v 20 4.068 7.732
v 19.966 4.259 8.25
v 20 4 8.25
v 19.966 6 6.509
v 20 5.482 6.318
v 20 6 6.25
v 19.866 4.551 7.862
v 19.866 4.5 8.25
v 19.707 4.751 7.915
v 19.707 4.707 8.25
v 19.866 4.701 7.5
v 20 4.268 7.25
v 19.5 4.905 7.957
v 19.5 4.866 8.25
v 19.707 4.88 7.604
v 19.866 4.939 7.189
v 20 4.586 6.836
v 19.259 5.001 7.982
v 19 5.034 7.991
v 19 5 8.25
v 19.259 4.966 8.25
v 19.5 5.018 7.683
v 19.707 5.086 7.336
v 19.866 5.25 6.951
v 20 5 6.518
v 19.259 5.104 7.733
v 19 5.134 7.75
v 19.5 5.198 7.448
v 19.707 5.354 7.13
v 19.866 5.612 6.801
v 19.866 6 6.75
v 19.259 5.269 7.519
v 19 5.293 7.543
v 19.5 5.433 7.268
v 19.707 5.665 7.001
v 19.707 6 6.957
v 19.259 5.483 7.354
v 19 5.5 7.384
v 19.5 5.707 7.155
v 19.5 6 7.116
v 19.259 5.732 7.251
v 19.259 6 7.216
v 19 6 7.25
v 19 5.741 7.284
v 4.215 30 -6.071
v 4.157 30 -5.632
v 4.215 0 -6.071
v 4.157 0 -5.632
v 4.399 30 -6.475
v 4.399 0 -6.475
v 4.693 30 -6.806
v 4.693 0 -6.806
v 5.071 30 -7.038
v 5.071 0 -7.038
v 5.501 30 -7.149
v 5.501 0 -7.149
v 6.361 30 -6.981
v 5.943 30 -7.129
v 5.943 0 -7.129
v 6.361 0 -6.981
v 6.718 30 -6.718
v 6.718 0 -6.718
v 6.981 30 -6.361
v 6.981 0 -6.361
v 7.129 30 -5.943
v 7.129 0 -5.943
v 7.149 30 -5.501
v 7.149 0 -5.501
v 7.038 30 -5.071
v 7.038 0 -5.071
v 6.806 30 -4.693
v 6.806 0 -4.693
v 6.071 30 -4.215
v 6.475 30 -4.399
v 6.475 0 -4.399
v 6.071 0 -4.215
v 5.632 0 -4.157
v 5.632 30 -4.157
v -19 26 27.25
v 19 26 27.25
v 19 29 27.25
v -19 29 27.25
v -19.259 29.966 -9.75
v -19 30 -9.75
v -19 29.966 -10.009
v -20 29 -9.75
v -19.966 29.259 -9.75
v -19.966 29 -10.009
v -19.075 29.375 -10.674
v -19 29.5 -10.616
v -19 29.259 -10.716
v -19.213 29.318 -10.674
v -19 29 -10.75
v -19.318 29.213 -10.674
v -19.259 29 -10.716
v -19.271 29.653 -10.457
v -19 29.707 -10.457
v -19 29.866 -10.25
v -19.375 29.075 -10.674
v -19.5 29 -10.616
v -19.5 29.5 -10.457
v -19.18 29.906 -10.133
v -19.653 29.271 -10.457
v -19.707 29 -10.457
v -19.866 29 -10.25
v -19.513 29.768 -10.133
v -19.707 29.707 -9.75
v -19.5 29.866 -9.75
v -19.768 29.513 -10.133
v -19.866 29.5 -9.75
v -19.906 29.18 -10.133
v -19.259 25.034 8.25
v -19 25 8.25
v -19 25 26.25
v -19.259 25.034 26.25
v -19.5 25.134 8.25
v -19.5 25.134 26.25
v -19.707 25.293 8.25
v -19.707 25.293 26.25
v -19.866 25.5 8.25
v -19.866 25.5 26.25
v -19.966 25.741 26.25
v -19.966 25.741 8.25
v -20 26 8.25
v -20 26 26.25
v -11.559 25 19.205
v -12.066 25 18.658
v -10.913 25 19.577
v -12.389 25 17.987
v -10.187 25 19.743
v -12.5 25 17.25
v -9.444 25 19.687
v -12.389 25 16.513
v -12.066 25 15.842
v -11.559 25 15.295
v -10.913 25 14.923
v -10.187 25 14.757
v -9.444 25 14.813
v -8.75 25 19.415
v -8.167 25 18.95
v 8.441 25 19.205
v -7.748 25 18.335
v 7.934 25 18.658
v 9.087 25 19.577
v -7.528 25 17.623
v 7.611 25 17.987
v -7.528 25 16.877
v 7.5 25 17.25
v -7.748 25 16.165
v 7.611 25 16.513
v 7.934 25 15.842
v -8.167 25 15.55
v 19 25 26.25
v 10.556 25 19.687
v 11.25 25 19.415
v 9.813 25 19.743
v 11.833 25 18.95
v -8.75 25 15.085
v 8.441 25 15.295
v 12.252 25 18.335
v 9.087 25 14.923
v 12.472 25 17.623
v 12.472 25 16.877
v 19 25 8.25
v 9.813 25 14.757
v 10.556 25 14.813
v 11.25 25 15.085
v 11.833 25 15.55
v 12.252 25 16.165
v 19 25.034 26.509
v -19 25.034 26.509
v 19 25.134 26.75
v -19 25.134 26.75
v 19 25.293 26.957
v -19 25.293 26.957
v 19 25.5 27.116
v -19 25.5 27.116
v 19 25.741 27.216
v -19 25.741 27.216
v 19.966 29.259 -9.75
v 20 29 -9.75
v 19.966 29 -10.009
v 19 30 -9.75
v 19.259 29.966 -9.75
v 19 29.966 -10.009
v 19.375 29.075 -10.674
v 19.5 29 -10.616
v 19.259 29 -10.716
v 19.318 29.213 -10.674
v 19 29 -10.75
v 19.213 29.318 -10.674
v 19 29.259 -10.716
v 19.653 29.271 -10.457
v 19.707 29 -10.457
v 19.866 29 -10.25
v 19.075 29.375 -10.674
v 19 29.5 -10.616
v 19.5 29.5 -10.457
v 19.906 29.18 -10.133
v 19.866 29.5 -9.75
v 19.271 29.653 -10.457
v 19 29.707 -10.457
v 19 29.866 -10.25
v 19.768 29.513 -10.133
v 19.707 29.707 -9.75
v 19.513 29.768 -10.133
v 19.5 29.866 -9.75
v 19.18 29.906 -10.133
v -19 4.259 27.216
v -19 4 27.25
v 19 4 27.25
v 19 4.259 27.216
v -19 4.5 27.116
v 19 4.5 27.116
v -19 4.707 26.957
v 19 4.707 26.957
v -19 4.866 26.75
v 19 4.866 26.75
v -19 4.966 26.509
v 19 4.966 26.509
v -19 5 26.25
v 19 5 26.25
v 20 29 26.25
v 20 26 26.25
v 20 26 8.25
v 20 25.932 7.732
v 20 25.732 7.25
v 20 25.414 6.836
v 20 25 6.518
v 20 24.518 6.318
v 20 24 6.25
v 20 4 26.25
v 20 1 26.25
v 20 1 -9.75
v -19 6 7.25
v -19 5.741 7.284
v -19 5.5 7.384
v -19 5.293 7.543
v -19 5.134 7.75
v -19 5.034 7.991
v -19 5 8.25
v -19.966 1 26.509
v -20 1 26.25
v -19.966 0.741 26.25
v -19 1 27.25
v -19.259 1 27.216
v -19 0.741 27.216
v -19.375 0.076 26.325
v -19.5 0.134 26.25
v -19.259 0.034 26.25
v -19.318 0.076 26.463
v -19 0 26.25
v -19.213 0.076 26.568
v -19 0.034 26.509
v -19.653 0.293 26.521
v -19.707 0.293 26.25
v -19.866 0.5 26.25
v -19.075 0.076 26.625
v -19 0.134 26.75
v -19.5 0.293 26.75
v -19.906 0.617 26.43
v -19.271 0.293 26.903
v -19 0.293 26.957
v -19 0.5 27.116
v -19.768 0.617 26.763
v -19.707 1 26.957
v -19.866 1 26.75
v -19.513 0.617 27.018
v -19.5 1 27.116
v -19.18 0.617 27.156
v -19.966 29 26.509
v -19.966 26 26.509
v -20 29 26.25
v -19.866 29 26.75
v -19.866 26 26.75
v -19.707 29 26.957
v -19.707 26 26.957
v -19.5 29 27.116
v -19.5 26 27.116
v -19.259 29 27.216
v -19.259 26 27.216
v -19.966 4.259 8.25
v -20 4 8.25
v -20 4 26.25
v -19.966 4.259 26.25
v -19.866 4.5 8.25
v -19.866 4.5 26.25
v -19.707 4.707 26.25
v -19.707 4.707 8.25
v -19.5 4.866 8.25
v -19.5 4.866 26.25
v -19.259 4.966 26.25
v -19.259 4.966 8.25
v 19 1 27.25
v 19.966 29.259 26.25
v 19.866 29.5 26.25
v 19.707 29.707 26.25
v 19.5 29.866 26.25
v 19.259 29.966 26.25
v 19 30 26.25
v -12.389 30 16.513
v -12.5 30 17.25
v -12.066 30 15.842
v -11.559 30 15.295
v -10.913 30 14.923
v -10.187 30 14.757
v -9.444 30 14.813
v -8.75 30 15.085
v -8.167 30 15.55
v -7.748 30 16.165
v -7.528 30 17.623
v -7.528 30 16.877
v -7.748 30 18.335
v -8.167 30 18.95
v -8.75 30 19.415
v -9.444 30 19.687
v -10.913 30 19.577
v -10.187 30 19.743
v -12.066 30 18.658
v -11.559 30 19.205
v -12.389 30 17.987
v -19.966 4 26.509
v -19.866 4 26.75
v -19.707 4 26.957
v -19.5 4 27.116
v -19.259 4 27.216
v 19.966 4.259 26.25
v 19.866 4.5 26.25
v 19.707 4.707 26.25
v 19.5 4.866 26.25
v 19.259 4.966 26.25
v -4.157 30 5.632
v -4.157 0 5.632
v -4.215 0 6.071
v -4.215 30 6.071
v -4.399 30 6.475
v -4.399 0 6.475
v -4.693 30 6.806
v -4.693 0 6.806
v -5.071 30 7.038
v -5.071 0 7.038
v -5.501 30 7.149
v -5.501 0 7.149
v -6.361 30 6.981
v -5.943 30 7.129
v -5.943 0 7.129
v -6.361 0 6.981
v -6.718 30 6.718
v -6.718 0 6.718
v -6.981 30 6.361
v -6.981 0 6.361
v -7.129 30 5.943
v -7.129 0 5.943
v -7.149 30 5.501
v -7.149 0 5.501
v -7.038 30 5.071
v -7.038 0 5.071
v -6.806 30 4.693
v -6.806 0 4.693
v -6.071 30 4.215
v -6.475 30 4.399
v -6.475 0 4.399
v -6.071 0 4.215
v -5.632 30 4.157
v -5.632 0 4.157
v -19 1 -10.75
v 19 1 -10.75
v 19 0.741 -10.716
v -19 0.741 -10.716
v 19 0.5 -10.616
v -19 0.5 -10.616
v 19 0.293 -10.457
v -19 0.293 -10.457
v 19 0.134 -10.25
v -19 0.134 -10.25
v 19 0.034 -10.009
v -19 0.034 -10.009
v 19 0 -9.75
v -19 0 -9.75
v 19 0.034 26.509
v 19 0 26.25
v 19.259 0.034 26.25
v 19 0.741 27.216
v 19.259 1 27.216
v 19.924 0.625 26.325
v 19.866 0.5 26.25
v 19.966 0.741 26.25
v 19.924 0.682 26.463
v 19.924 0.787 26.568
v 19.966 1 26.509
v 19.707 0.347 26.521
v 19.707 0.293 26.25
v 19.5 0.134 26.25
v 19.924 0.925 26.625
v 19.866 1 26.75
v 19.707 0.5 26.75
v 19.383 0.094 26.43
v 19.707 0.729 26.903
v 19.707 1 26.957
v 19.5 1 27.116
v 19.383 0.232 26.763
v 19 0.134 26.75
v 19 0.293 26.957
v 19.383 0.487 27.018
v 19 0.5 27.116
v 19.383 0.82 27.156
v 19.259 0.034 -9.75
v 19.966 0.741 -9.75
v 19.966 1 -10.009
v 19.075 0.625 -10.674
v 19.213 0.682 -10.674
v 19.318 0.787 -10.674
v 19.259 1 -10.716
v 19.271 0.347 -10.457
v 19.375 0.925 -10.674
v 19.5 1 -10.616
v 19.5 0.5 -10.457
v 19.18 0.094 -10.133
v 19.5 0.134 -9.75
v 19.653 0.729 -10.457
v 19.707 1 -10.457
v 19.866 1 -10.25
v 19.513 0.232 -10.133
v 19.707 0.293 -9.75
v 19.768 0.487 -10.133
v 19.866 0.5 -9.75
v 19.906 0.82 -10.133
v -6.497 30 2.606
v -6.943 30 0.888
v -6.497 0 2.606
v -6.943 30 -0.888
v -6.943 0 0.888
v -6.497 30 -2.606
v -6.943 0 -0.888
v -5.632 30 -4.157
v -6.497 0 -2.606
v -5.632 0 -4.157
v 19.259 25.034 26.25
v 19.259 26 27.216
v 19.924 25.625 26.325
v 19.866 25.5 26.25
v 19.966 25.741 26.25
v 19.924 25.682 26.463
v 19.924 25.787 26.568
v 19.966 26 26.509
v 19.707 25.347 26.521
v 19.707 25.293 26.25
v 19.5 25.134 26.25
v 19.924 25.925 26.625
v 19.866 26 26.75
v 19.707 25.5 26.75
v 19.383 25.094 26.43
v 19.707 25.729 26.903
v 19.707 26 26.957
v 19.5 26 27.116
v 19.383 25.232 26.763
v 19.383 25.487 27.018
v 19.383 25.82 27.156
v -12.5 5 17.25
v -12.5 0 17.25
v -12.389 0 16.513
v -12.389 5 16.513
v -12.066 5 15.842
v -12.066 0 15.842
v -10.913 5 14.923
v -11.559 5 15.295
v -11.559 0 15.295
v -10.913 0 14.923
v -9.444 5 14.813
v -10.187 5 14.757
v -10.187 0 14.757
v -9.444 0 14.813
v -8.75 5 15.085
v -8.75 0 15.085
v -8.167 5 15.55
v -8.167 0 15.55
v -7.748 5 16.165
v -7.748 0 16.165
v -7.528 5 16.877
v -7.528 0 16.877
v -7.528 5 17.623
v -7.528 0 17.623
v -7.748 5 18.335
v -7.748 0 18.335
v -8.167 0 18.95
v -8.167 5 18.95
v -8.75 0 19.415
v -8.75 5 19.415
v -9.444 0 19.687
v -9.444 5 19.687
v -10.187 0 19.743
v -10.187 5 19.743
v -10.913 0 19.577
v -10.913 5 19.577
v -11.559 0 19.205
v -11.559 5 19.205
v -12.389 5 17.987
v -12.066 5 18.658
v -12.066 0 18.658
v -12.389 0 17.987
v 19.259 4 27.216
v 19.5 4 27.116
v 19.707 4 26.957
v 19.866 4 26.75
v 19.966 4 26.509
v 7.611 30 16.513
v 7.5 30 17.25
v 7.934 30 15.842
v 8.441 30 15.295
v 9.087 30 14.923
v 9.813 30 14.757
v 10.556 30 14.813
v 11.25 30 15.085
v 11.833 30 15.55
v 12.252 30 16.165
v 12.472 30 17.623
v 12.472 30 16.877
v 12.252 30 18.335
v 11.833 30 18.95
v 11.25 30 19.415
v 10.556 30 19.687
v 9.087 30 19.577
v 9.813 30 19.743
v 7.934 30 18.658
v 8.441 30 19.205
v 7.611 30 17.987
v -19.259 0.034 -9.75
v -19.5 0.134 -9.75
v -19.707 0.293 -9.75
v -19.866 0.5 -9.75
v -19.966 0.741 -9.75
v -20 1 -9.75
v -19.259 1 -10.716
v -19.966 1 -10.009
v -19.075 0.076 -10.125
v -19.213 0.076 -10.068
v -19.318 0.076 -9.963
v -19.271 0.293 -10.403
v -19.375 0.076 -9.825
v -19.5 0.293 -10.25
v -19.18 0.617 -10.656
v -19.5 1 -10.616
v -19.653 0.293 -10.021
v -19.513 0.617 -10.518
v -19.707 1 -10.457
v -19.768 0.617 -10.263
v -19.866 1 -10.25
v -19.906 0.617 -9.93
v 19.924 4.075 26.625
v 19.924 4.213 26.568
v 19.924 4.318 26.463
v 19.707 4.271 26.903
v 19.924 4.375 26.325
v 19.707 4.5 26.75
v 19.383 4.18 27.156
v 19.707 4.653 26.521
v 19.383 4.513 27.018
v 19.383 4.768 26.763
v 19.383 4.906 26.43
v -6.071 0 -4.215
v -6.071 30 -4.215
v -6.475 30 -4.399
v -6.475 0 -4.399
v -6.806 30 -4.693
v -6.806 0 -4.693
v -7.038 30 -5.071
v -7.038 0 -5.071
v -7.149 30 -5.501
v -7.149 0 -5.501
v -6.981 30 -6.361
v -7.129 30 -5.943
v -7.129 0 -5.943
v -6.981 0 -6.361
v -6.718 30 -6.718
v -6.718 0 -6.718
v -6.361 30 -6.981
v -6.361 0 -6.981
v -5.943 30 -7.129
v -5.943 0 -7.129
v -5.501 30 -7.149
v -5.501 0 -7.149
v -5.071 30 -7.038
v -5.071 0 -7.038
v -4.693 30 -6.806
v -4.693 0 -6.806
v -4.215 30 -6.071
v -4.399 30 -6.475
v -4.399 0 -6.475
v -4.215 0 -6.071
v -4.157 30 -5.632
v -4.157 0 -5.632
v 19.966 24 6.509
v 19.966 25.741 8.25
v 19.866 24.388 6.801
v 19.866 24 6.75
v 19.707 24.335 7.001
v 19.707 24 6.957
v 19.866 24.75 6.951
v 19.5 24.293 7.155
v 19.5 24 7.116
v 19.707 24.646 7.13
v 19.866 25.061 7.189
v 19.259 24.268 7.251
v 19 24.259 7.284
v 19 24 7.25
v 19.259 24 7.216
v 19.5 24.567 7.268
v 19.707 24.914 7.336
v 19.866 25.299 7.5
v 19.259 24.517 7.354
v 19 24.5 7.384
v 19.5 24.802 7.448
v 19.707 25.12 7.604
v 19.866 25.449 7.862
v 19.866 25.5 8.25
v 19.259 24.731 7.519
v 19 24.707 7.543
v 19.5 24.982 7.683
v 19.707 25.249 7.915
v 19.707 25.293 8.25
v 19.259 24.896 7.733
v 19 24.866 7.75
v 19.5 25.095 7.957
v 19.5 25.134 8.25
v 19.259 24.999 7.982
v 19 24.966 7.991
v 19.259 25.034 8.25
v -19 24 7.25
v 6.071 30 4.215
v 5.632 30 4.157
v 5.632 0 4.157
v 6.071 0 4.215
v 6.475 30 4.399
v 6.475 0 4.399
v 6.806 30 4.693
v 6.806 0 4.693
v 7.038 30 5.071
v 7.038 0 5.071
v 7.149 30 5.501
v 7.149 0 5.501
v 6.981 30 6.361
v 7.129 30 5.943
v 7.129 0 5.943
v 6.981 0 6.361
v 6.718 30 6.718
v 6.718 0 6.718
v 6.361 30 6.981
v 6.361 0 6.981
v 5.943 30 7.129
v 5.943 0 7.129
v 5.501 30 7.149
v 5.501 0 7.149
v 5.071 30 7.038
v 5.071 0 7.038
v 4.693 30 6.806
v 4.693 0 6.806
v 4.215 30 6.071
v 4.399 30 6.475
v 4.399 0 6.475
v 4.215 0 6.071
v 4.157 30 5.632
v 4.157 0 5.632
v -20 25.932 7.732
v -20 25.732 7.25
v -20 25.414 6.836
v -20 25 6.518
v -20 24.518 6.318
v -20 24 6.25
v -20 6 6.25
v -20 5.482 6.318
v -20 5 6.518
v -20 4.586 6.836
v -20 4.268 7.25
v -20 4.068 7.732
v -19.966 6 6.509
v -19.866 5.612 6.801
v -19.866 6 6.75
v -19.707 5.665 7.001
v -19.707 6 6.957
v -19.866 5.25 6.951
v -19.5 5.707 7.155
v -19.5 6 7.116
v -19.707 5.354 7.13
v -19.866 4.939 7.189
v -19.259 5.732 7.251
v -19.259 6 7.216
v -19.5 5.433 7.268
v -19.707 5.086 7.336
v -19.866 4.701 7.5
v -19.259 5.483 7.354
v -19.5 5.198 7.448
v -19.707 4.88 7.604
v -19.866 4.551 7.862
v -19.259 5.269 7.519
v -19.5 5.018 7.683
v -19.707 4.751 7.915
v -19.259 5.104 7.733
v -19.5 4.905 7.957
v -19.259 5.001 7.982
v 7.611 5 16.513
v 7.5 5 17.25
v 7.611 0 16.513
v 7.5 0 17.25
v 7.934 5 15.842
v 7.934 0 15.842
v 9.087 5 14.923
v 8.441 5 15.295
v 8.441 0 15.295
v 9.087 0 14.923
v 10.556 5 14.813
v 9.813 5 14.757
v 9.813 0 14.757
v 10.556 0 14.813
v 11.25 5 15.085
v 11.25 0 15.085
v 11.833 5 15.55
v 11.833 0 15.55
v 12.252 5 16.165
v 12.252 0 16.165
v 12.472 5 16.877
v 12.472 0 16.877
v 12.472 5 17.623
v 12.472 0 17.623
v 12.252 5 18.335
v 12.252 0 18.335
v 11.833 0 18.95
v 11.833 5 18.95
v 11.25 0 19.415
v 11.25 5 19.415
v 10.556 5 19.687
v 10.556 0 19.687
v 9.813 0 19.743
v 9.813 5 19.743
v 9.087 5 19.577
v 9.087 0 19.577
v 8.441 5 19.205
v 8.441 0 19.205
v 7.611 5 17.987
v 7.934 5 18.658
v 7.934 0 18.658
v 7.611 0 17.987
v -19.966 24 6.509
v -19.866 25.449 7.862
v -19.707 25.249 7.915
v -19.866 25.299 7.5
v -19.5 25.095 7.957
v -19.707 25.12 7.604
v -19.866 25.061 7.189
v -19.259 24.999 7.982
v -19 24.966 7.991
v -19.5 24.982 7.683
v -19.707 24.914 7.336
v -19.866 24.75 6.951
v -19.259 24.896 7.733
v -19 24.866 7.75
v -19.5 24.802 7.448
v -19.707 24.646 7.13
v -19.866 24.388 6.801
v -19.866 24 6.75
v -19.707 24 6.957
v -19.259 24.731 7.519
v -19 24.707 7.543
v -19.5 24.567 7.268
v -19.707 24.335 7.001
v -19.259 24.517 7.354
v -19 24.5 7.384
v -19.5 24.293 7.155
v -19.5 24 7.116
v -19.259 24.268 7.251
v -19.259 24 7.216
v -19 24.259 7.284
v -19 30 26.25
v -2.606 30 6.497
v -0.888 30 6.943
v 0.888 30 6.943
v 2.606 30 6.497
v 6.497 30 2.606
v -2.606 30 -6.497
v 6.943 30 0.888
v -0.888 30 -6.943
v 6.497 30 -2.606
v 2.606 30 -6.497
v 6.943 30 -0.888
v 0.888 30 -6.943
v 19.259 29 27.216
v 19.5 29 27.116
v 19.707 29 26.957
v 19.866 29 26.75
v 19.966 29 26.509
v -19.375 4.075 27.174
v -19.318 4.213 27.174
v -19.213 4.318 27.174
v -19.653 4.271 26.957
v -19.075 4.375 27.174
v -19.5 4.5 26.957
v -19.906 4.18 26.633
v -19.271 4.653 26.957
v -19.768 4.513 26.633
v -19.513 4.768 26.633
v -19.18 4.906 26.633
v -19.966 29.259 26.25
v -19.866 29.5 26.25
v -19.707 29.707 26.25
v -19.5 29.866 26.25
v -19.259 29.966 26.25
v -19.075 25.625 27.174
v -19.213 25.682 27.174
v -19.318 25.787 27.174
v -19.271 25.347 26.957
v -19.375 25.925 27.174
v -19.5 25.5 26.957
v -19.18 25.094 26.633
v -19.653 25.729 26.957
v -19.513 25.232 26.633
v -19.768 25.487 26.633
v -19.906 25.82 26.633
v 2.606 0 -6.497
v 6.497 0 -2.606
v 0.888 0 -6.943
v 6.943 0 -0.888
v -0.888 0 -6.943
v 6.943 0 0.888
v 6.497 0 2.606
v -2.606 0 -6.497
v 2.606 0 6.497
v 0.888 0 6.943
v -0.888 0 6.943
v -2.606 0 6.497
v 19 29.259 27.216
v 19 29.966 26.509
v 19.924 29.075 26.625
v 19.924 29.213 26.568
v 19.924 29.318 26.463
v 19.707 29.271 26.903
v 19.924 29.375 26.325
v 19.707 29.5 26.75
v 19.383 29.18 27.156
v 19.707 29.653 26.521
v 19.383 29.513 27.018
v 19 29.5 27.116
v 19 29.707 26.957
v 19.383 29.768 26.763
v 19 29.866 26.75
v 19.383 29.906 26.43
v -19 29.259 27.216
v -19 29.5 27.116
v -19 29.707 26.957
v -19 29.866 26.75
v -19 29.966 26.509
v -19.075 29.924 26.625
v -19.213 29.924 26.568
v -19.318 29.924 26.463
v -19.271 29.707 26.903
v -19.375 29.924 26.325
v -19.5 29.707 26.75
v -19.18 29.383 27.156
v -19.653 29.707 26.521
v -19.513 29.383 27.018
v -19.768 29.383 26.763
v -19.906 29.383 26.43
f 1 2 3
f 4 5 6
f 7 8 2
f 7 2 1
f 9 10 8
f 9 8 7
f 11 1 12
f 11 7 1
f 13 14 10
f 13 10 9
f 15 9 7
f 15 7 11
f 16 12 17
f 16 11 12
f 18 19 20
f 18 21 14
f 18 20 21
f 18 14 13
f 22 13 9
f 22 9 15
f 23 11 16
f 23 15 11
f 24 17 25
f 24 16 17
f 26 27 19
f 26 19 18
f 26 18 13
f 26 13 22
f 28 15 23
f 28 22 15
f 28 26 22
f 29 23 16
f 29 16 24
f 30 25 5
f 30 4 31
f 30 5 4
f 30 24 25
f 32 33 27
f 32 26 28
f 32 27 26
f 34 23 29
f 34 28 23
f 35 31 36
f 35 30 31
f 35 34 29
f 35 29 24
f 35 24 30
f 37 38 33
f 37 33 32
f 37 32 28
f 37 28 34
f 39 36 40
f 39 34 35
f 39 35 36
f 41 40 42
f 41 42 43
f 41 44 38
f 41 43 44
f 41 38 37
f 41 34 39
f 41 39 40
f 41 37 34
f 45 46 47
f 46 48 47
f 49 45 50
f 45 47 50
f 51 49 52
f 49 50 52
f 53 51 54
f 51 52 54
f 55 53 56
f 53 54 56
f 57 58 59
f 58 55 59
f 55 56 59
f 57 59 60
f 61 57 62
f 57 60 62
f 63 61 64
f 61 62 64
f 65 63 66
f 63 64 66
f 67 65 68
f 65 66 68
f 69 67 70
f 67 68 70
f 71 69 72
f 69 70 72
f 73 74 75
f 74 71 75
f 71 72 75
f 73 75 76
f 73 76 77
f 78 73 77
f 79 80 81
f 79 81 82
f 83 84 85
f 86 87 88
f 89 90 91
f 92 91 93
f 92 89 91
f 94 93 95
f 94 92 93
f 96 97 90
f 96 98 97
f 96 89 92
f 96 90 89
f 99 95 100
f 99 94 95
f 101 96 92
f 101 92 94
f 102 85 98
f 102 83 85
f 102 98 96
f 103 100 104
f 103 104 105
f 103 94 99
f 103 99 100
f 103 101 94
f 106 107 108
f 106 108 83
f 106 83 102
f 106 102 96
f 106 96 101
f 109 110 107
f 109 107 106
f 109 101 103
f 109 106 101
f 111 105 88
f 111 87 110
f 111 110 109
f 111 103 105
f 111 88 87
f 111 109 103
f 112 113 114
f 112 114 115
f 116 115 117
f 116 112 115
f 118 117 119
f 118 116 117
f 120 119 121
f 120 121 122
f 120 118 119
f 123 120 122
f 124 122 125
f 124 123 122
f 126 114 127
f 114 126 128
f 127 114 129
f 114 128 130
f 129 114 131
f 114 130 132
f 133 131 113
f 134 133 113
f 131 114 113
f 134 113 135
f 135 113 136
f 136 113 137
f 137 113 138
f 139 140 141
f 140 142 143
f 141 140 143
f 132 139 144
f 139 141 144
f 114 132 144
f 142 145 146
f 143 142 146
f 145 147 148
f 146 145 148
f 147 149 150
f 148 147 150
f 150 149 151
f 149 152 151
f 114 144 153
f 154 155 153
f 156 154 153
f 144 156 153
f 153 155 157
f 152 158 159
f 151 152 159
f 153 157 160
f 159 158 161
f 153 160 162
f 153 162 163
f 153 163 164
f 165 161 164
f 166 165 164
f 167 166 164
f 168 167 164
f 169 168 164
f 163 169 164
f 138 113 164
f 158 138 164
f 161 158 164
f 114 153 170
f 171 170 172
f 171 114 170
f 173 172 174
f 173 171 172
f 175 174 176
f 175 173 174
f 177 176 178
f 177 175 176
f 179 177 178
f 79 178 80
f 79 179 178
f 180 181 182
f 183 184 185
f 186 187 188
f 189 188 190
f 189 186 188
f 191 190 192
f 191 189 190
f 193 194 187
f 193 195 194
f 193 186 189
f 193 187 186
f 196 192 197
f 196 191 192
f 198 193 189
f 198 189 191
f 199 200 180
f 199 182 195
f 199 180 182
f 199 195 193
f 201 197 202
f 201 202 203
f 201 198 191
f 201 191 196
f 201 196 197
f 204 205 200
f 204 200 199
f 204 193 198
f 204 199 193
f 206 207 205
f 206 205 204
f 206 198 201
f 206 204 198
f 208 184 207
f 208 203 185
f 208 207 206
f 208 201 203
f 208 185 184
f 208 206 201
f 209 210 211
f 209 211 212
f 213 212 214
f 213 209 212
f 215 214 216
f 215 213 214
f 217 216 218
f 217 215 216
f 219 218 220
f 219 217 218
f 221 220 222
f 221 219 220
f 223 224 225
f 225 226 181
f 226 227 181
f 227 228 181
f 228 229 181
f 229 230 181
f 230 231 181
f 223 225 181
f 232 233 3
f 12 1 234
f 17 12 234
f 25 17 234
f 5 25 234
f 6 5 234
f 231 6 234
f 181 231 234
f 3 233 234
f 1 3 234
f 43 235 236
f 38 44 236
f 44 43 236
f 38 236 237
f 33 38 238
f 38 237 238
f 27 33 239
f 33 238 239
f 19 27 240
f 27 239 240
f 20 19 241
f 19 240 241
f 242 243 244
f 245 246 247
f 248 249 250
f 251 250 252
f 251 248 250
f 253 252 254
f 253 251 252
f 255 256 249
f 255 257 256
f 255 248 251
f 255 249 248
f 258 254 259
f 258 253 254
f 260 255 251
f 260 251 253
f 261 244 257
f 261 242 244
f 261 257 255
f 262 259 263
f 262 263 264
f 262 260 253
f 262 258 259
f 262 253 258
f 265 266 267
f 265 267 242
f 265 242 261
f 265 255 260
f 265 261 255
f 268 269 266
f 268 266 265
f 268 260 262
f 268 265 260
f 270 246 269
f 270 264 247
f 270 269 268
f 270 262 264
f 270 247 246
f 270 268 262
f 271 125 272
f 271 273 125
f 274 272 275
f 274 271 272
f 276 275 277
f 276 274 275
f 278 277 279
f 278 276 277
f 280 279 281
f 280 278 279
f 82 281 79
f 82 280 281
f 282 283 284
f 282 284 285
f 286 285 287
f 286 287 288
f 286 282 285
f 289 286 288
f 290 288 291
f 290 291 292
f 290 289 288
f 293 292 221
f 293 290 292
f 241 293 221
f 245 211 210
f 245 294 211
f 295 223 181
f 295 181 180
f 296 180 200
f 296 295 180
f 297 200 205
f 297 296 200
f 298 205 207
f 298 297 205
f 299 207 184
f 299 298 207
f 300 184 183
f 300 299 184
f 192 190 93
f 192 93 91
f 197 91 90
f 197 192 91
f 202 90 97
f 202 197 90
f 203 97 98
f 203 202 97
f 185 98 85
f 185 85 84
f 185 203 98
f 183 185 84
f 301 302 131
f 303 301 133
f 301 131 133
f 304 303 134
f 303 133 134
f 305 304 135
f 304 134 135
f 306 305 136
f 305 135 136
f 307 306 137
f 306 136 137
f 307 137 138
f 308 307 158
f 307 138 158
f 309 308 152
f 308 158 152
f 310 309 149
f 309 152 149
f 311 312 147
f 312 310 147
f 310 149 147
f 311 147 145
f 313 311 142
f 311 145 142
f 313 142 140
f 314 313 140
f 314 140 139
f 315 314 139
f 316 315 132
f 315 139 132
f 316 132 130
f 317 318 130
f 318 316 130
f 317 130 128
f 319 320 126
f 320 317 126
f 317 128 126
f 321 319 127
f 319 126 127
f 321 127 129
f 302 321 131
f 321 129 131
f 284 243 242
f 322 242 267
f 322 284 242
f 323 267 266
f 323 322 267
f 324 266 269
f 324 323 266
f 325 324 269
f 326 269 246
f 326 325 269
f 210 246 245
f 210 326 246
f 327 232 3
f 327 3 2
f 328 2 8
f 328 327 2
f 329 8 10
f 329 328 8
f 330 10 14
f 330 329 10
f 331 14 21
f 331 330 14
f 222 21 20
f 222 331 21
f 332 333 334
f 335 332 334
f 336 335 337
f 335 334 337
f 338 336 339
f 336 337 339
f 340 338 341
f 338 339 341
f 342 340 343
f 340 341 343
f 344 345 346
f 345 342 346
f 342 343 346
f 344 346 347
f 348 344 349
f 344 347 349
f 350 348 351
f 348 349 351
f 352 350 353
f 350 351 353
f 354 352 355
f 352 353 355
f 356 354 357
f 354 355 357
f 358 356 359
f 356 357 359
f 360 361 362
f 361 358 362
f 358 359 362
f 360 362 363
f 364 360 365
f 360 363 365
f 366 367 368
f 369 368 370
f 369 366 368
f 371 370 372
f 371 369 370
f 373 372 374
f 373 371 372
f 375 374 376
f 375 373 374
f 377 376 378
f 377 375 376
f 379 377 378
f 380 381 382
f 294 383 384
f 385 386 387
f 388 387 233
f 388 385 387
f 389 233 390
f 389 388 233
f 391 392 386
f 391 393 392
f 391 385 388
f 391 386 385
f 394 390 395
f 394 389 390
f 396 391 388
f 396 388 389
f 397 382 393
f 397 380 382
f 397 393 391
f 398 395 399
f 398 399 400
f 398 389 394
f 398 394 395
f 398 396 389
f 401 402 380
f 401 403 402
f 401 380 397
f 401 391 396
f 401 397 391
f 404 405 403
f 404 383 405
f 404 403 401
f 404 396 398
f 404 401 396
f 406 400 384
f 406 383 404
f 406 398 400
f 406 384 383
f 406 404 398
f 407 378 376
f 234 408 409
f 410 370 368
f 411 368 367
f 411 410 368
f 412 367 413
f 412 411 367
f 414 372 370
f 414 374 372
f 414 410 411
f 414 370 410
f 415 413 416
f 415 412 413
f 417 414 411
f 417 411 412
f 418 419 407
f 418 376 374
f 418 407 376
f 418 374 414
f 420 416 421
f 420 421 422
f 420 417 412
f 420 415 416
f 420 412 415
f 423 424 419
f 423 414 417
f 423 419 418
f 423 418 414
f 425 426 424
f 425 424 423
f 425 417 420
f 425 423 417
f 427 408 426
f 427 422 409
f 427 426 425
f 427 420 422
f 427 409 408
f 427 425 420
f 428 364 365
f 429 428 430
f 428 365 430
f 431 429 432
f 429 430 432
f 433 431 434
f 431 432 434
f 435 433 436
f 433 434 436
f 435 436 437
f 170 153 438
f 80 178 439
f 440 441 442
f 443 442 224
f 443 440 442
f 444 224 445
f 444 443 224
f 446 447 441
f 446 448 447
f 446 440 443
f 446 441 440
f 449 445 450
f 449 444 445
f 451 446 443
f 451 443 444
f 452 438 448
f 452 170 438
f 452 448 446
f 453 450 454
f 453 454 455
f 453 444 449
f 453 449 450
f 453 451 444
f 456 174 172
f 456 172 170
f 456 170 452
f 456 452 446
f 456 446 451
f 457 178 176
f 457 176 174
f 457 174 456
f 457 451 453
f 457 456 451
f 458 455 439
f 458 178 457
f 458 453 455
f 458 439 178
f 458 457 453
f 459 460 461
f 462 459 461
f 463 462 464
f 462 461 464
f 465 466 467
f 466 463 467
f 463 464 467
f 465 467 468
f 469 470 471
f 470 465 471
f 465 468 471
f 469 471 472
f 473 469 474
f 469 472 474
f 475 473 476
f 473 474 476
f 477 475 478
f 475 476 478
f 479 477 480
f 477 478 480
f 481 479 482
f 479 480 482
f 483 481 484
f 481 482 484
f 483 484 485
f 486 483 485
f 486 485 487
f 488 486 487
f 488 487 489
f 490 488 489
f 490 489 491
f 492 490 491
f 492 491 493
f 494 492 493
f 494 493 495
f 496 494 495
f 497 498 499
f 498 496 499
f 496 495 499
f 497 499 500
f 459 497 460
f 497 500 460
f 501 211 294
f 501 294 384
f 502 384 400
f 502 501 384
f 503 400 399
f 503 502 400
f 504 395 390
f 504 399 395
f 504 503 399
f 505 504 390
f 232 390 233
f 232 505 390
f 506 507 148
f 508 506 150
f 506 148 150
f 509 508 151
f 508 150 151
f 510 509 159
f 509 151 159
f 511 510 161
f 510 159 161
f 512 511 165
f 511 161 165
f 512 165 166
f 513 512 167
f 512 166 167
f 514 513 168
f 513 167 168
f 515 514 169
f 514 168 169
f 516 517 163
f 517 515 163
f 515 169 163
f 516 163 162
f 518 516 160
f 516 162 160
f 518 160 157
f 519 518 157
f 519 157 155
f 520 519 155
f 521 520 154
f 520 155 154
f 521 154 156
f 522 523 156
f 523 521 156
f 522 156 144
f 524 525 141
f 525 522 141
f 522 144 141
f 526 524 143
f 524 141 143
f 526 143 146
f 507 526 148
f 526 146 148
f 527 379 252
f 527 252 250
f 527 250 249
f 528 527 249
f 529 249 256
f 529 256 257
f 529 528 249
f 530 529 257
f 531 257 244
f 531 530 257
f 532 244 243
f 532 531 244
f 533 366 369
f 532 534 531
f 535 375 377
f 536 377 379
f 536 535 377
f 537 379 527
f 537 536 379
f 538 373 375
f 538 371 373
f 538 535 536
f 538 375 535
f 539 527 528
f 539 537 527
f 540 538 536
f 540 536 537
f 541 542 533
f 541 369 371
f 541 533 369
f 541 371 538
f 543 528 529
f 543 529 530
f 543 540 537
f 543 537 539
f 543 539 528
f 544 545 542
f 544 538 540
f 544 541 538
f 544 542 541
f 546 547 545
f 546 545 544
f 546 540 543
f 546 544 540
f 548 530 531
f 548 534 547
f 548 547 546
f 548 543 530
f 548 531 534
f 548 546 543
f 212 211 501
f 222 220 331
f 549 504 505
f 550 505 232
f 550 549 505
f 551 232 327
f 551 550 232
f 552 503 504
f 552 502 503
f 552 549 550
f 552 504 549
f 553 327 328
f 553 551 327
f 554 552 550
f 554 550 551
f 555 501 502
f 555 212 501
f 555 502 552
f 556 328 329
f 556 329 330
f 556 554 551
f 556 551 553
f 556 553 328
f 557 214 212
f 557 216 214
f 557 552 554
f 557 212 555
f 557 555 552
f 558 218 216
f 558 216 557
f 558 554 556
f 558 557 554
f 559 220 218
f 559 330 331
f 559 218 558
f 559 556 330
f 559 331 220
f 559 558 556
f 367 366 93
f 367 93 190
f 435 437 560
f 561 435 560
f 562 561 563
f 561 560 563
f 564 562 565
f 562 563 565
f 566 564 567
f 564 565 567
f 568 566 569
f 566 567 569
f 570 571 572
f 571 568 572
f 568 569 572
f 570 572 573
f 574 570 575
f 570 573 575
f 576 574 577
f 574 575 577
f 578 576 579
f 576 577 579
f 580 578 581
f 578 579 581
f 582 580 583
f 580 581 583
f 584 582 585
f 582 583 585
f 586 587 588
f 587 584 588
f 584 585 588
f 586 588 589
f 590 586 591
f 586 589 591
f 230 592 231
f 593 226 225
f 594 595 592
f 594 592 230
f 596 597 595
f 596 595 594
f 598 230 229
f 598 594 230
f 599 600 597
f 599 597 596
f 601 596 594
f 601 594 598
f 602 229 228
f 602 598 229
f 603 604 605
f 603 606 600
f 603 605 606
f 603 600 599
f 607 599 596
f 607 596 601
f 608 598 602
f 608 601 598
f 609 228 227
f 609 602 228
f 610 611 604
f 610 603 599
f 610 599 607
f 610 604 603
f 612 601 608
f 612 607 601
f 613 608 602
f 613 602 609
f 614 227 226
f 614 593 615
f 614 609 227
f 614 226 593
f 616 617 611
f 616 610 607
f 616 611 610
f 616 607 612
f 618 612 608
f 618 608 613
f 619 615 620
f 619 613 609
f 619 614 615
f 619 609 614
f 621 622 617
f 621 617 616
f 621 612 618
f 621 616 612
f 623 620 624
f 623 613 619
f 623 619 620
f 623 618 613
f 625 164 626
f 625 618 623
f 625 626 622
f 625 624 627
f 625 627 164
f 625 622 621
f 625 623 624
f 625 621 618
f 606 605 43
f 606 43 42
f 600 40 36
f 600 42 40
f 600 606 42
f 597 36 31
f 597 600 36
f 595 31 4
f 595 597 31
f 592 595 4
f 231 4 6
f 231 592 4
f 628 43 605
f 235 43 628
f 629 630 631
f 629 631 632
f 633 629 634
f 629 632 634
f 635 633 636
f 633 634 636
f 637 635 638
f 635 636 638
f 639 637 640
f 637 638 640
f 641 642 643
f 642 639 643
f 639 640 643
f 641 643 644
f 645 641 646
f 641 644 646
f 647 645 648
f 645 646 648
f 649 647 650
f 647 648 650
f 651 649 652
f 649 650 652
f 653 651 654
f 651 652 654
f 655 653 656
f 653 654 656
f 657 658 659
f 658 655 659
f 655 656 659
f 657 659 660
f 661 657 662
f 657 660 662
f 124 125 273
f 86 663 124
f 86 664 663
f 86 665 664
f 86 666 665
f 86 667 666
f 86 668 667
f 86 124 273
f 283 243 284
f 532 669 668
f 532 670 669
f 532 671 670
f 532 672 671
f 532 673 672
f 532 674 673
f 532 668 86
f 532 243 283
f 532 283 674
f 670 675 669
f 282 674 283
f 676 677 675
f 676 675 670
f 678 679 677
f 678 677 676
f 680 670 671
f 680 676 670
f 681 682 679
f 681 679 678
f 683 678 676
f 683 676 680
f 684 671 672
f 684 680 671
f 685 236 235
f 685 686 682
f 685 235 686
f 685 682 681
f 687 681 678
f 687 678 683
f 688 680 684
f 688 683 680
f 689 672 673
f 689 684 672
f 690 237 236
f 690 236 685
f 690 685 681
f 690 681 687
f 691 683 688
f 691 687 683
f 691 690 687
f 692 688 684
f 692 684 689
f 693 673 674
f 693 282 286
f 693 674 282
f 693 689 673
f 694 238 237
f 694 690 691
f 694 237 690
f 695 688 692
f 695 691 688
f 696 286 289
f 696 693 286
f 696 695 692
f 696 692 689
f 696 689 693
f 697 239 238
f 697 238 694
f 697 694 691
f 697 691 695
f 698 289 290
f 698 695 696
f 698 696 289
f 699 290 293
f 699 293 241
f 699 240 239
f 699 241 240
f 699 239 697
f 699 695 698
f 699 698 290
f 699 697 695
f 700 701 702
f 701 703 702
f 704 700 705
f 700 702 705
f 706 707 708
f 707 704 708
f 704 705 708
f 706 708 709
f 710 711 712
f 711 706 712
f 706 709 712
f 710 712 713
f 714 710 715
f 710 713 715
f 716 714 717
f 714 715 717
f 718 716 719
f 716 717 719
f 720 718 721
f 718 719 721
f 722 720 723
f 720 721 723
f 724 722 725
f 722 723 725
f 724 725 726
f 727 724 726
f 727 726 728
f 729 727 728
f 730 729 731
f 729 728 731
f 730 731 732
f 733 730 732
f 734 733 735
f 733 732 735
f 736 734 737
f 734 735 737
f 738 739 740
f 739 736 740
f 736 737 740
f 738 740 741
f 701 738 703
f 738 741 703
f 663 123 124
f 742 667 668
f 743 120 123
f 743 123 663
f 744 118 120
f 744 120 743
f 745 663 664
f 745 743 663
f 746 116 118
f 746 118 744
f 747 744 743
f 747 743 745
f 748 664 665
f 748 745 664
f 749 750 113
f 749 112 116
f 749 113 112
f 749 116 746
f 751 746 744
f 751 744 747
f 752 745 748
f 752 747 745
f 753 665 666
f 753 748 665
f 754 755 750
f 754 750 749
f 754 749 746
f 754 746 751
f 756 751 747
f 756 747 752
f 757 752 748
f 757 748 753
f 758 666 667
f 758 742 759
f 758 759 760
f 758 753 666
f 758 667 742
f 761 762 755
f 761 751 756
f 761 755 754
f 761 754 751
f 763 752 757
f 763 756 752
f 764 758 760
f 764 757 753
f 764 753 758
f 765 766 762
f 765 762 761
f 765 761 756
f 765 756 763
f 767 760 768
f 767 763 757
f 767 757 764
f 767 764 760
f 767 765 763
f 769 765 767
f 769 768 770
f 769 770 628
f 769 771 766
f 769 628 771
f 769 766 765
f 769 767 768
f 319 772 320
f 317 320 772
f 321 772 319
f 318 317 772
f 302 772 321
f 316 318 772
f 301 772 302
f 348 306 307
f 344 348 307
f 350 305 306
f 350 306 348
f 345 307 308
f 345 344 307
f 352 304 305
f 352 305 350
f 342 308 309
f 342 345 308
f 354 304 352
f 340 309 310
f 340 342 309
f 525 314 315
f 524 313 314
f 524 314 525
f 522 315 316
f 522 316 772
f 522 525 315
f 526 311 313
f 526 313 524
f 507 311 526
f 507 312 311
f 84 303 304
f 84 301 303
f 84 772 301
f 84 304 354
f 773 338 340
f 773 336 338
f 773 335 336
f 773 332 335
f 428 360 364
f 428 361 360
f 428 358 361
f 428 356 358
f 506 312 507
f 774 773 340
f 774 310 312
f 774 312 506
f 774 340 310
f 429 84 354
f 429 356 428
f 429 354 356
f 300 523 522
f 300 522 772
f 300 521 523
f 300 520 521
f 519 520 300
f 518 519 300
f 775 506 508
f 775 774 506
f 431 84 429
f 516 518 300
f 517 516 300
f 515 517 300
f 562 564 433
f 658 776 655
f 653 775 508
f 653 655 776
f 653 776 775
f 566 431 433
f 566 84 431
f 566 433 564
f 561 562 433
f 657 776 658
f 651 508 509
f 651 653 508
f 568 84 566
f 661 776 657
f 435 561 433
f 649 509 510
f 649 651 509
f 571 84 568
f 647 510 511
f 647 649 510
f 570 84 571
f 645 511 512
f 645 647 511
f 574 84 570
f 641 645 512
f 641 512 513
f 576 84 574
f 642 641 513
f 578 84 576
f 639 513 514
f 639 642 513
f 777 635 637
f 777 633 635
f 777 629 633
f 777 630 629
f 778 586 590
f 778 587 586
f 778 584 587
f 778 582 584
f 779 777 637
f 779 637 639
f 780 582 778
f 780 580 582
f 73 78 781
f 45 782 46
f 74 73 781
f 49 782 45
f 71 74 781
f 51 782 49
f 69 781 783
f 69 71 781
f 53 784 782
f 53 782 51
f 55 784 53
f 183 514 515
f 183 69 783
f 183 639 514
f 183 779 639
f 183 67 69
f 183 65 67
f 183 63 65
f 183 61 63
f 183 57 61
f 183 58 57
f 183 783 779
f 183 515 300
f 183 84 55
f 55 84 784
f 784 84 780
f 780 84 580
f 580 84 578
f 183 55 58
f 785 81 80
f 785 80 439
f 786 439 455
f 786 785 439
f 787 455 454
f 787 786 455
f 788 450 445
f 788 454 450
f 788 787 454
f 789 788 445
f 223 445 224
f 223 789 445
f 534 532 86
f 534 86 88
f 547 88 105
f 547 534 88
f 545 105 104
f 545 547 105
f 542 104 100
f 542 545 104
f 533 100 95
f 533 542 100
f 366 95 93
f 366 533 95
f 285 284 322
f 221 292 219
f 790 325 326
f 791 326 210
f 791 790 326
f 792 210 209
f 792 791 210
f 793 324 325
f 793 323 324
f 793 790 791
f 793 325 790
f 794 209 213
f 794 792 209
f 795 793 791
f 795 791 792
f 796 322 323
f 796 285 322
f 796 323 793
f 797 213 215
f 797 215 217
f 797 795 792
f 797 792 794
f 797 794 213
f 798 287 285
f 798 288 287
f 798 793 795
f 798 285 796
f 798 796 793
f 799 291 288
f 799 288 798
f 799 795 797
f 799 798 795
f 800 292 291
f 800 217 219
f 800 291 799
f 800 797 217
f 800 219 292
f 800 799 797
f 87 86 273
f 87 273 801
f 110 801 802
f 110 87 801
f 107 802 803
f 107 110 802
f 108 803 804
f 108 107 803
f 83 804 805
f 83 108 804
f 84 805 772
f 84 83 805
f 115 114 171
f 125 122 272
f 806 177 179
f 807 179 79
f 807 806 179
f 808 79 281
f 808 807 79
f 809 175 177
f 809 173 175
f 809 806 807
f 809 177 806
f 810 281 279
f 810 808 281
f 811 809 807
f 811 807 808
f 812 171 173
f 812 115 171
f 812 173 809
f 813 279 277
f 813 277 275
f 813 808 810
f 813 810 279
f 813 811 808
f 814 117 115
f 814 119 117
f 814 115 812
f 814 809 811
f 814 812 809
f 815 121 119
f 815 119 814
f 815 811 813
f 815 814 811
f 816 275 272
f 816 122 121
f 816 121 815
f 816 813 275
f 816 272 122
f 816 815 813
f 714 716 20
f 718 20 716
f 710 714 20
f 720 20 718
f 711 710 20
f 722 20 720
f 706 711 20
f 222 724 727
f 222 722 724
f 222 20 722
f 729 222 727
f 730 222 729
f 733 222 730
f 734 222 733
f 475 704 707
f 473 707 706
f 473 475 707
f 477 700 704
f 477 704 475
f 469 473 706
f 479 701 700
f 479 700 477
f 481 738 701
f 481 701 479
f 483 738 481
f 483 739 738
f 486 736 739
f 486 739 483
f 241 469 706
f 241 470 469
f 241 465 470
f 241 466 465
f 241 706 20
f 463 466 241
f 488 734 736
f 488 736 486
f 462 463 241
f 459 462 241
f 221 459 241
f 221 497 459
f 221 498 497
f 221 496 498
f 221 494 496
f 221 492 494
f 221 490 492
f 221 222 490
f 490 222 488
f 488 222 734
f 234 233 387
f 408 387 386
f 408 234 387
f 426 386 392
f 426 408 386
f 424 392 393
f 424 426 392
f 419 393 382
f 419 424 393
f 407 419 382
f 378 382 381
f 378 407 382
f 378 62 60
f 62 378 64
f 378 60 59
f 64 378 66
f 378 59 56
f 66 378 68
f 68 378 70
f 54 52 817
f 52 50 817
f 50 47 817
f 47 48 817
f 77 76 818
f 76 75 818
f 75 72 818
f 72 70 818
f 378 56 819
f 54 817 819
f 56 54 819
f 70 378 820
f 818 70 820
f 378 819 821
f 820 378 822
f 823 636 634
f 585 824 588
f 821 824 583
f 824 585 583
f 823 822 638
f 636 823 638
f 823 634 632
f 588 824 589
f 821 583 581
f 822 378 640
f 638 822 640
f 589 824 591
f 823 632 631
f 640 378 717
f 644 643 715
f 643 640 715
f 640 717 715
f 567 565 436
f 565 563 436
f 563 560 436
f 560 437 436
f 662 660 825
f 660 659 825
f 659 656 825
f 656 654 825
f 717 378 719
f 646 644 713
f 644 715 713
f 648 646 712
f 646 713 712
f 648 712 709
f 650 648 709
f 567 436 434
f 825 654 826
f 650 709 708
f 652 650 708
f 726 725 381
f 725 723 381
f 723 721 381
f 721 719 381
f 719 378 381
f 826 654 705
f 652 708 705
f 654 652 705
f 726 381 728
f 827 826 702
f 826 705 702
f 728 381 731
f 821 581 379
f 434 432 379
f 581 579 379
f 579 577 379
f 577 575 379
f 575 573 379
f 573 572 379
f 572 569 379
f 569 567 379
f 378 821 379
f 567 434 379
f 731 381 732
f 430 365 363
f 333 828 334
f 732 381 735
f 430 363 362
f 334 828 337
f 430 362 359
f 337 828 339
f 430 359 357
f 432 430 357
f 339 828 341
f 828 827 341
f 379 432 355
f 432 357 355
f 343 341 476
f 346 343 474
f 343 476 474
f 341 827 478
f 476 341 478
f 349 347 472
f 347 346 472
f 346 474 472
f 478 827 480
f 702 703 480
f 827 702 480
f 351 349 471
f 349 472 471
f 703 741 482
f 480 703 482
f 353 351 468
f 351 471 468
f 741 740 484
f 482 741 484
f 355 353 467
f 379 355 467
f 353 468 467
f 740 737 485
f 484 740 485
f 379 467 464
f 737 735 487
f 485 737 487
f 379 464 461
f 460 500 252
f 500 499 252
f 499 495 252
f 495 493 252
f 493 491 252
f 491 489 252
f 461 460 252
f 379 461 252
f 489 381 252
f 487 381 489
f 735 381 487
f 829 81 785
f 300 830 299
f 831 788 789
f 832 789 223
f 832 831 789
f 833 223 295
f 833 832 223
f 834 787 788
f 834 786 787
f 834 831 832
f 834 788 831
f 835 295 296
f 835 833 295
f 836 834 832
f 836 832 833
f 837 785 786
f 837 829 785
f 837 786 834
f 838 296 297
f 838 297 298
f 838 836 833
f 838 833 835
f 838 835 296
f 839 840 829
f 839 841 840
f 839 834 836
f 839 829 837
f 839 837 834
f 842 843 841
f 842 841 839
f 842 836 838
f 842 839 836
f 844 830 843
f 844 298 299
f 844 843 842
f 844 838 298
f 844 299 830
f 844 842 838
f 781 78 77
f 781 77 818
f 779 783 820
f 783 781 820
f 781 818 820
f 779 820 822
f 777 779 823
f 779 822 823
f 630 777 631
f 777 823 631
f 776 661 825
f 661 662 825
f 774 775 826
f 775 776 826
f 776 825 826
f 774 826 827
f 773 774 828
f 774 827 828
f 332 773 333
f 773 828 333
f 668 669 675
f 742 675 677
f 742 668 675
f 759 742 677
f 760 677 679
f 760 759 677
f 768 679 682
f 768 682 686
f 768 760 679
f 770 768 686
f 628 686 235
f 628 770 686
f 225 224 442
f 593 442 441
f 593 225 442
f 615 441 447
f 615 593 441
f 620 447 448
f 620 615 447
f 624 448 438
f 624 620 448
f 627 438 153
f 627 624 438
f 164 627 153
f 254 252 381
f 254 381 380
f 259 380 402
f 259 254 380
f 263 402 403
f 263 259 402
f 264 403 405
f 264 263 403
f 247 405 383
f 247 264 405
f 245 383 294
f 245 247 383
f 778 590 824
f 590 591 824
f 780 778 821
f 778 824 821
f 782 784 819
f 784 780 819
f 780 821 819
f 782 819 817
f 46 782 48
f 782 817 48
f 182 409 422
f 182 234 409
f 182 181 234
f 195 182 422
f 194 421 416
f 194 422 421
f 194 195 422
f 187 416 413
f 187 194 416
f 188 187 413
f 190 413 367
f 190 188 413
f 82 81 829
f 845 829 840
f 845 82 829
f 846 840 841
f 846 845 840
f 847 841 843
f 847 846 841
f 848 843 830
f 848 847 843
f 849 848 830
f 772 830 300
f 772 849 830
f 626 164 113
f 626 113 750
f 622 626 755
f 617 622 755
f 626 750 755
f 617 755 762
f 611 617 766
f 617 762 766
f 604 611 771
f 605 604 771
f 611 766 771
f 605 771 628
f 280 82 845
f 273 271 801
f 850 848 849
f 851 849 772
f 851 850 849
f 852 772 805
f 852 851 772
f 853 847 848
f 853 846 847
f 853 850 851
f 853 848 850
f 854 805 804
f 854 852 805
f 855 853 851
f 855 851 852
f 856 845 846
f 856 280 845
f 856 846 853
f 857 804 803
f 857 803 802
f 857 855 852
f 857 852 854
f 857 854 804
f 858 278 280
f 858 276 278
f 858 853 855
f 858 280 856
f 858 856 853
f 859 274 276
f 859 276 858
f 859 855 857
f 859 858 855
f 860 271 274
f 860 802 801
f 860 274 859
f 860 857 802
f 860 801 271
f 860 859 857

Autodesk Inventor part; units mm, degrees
ref_plane "YZ Plane" through (0, 0, 0) normal (1, 0, 0) x (0, 1, 0)
ref_plane "XZ Plane" through (0, 0, 0) normal (0, 1, 0) x (-1, 0, 0)
ref_plane "XY Plane" through (0, 0, 0) normal (0, 0, 1) x (1, 0, 0)
sketch "Sketch1" plane through (0, 0, 0) normal (0, 1, 0) x (-1, 0, 0)
  circle A0 centre (0, 0) radius 7
  circle A1 centre (0, 0) radius 8 construction
  line L0 (0, 0) -> (5.6569, -5.6569) construction
  line L1 (0, 0) -> (8, 0) construction
  line L2 (0, 0) -> (-5.6569, -5.6569) construction
  line L3 (0, 0) -> (8, 0) construction
  line L4 (0, 0) -> (5.6569, 5.6569) construction
  line L5 (0, 0) -> (-5.6569, 5.6569) construction
  arc A2 (5.6319, 4.1571) -> (4.1571, 5.6319) centre (5.6569, 5.6569) ccw
  arc A3 (-4.1571, 5.6319) -> (-5.6319, 4.1571) centre (-5.6569, 5.6569) ccw
  arc A4 (-5.6319, -4.1571) -> (-4.1571, -5.6319) centre (-5.6569, -5.6569) ccw
  arc A5 (4.1571, -5.6319) -> (5.6319, -4.1571) centre (5.6569, -5.6569) ccw
  arc A6 (4.5962, 4.5962) -> (5.6319, 4.1571) centre (5.6569, 5.6569) ccw
  arc A7 (4.1571, 5.6319) -> (4.5962, 4.5962) centre (5.6569, 5.6569) ccw
  arc A8 (-4.5962, 4.5962) -> (-4.1571, 5.6319) centre (-5.6569, 5.6569) ccw
  arc A9 (-5.6319, 4.1571) -> (-4.5962, 4.5962) centre (-5.6569, 5.6569) ccw
  arc A10 (-4.5962, -4.5962) -> (-5.6319, -4.1571) centre (-5.6569, -5.6569) ccw
  arc A11 (-4.1571, -5.6319) -> (-4.5962, -4.5962) centre (-5.6569, -5.6569) ccw
  arc A12 (4.5962, -4.5962) -> (4.1571, -5.6319) centre (5.6569, -5.6569) ccw
  arc A13 (5.6319, -4.1571) -> (4.5962, -4.5962) centre (5.6569, -5.6569) ccw
  line L6 (-20, 7.25) -> (20, 7.25)
  line L7 (20, 7.25) -> (20, -7.25) construction
  line L8 (20, -7.25) -> (-20, -7.25) construction
  line L9 (-20, -7.25) -> (-20, 7.25) construction
  line L10 (-20, 7.25) -> (20, -7.25) construction
  line L11 (20, 7.25) -> (-20, -7.25) construction
  line L12 (20, 7.25) -> (-20, 7.25)
  line L13 (-20, 7.25) -> (-20, 27.25)
  line L14 (-20, 27.25) -> (20, 27.25)
  line L15 (20, 27.25) -> (20, 7.25)
  line L16 (20, 17.25) -> (-20, 17.25) construction
  circle A14 centre (10, 17.25) radius 2.5
  circle A15 centre (-10, 17.25) radius 2.5
  line L17 (20, 7.25) -> (-20, 7.25)
  line L18 (-20, 7.25) -> (-20, -10.75)
  line L19 (-20, -10.75) -> (20, -10.75)
  line L20 (20, -10.75) -> (20, 7.25)
  dimension "d0" = 14
  dimension "d1" = 16
  dimension "d2" = 45
  dimension "d3" = 135
  dimension "d4" = 3
  dimension "d5" = 3
  dimension "d6" = 3
  dimension "d7" = 3
  dimension "d9" = 14.5
  dimension "d10" = 20
  dimension "d11" = 40
  dimension "d14" = 5
  dimension "d15" = 5
  dimension "d16" = 10
  dimension "d17" = 10
  dimension "d22" = 18
  dimension "d23" = 40
  dimension "d24" = 40
extrude "Extrusion1" add sketch "Sketch1" along normal blind 5 contours L13 L14 L15 L6
extrude "Extrusion3" add sketch "Sketch1" along normal blind 25 contours L6 L20 L19 L18
sketch "Sketch3" plane through (0, 25, 0) normal (0, 1, 0) x (1, 0, 0)
  line L0 (20, -27.25) -> (20, -7.25) projected
  line L1 (-20, 10.75) -> (20, 10.75)
  line L2 (20, 10.75) -> (20, -27.25)
  line L3 (20, -27.25) -> (-20, -27.25)
  line L4 (-20, -27.25) -> (-20, 10.75)
  point P0 (0, 0)
extrude "Extrusion4" add sketch "Sketch3" along normal blind 5
extrude "Extrusion5" cut sketch "Sketch1" along normal blind 30 contours A0 A13 A12 A11 A10 A9 A8 A7 A6 | A6 A7 A0 | A0 A2 | A5 A0 | A0 A12 A13 | A8 A9 A0 | A0 A3 | A4 A0 | A0 A10 A11 | A14 | A15
fillet "Fillet2" radius 1 24 edges at (-20, 15, 7.25) (0, 25, 7.25) (-20, 25, 17.25) (0, 25, 27.25) (-20, 27.5, 27.25) (0, 30, 27.25) (20, 27.5, 27.25) (20, 25, 17.25) (-20, 30, 8.25) (-20, 15, -10.75) (-20, 5, 17.25) (-20, 2.5, 27.25) (0, 5, 27.25) (0, 0, 27.25) (-20, 0, 8.25) (20, 0, 8.25) (20, 2.5, 27.25) (20, 15, 7.25) (0, 5, 7.25) (20, 5, 17.25) (20, 30, 8.25) (20, 15, -10.75) (0, 30, -10.75) (0, 0, -10.75)
equation "\"d4\" = d5"
equation "\"d6\" = d5"
equation "\"d7\" = d5"
equation "\"d11\" = d13"
equation "\"d17\" = d16"
equation "\"d24\" = d23"
equation "\"d13\" = 40"
properties part number "z_nut_holder" material "ABS Plastic"
